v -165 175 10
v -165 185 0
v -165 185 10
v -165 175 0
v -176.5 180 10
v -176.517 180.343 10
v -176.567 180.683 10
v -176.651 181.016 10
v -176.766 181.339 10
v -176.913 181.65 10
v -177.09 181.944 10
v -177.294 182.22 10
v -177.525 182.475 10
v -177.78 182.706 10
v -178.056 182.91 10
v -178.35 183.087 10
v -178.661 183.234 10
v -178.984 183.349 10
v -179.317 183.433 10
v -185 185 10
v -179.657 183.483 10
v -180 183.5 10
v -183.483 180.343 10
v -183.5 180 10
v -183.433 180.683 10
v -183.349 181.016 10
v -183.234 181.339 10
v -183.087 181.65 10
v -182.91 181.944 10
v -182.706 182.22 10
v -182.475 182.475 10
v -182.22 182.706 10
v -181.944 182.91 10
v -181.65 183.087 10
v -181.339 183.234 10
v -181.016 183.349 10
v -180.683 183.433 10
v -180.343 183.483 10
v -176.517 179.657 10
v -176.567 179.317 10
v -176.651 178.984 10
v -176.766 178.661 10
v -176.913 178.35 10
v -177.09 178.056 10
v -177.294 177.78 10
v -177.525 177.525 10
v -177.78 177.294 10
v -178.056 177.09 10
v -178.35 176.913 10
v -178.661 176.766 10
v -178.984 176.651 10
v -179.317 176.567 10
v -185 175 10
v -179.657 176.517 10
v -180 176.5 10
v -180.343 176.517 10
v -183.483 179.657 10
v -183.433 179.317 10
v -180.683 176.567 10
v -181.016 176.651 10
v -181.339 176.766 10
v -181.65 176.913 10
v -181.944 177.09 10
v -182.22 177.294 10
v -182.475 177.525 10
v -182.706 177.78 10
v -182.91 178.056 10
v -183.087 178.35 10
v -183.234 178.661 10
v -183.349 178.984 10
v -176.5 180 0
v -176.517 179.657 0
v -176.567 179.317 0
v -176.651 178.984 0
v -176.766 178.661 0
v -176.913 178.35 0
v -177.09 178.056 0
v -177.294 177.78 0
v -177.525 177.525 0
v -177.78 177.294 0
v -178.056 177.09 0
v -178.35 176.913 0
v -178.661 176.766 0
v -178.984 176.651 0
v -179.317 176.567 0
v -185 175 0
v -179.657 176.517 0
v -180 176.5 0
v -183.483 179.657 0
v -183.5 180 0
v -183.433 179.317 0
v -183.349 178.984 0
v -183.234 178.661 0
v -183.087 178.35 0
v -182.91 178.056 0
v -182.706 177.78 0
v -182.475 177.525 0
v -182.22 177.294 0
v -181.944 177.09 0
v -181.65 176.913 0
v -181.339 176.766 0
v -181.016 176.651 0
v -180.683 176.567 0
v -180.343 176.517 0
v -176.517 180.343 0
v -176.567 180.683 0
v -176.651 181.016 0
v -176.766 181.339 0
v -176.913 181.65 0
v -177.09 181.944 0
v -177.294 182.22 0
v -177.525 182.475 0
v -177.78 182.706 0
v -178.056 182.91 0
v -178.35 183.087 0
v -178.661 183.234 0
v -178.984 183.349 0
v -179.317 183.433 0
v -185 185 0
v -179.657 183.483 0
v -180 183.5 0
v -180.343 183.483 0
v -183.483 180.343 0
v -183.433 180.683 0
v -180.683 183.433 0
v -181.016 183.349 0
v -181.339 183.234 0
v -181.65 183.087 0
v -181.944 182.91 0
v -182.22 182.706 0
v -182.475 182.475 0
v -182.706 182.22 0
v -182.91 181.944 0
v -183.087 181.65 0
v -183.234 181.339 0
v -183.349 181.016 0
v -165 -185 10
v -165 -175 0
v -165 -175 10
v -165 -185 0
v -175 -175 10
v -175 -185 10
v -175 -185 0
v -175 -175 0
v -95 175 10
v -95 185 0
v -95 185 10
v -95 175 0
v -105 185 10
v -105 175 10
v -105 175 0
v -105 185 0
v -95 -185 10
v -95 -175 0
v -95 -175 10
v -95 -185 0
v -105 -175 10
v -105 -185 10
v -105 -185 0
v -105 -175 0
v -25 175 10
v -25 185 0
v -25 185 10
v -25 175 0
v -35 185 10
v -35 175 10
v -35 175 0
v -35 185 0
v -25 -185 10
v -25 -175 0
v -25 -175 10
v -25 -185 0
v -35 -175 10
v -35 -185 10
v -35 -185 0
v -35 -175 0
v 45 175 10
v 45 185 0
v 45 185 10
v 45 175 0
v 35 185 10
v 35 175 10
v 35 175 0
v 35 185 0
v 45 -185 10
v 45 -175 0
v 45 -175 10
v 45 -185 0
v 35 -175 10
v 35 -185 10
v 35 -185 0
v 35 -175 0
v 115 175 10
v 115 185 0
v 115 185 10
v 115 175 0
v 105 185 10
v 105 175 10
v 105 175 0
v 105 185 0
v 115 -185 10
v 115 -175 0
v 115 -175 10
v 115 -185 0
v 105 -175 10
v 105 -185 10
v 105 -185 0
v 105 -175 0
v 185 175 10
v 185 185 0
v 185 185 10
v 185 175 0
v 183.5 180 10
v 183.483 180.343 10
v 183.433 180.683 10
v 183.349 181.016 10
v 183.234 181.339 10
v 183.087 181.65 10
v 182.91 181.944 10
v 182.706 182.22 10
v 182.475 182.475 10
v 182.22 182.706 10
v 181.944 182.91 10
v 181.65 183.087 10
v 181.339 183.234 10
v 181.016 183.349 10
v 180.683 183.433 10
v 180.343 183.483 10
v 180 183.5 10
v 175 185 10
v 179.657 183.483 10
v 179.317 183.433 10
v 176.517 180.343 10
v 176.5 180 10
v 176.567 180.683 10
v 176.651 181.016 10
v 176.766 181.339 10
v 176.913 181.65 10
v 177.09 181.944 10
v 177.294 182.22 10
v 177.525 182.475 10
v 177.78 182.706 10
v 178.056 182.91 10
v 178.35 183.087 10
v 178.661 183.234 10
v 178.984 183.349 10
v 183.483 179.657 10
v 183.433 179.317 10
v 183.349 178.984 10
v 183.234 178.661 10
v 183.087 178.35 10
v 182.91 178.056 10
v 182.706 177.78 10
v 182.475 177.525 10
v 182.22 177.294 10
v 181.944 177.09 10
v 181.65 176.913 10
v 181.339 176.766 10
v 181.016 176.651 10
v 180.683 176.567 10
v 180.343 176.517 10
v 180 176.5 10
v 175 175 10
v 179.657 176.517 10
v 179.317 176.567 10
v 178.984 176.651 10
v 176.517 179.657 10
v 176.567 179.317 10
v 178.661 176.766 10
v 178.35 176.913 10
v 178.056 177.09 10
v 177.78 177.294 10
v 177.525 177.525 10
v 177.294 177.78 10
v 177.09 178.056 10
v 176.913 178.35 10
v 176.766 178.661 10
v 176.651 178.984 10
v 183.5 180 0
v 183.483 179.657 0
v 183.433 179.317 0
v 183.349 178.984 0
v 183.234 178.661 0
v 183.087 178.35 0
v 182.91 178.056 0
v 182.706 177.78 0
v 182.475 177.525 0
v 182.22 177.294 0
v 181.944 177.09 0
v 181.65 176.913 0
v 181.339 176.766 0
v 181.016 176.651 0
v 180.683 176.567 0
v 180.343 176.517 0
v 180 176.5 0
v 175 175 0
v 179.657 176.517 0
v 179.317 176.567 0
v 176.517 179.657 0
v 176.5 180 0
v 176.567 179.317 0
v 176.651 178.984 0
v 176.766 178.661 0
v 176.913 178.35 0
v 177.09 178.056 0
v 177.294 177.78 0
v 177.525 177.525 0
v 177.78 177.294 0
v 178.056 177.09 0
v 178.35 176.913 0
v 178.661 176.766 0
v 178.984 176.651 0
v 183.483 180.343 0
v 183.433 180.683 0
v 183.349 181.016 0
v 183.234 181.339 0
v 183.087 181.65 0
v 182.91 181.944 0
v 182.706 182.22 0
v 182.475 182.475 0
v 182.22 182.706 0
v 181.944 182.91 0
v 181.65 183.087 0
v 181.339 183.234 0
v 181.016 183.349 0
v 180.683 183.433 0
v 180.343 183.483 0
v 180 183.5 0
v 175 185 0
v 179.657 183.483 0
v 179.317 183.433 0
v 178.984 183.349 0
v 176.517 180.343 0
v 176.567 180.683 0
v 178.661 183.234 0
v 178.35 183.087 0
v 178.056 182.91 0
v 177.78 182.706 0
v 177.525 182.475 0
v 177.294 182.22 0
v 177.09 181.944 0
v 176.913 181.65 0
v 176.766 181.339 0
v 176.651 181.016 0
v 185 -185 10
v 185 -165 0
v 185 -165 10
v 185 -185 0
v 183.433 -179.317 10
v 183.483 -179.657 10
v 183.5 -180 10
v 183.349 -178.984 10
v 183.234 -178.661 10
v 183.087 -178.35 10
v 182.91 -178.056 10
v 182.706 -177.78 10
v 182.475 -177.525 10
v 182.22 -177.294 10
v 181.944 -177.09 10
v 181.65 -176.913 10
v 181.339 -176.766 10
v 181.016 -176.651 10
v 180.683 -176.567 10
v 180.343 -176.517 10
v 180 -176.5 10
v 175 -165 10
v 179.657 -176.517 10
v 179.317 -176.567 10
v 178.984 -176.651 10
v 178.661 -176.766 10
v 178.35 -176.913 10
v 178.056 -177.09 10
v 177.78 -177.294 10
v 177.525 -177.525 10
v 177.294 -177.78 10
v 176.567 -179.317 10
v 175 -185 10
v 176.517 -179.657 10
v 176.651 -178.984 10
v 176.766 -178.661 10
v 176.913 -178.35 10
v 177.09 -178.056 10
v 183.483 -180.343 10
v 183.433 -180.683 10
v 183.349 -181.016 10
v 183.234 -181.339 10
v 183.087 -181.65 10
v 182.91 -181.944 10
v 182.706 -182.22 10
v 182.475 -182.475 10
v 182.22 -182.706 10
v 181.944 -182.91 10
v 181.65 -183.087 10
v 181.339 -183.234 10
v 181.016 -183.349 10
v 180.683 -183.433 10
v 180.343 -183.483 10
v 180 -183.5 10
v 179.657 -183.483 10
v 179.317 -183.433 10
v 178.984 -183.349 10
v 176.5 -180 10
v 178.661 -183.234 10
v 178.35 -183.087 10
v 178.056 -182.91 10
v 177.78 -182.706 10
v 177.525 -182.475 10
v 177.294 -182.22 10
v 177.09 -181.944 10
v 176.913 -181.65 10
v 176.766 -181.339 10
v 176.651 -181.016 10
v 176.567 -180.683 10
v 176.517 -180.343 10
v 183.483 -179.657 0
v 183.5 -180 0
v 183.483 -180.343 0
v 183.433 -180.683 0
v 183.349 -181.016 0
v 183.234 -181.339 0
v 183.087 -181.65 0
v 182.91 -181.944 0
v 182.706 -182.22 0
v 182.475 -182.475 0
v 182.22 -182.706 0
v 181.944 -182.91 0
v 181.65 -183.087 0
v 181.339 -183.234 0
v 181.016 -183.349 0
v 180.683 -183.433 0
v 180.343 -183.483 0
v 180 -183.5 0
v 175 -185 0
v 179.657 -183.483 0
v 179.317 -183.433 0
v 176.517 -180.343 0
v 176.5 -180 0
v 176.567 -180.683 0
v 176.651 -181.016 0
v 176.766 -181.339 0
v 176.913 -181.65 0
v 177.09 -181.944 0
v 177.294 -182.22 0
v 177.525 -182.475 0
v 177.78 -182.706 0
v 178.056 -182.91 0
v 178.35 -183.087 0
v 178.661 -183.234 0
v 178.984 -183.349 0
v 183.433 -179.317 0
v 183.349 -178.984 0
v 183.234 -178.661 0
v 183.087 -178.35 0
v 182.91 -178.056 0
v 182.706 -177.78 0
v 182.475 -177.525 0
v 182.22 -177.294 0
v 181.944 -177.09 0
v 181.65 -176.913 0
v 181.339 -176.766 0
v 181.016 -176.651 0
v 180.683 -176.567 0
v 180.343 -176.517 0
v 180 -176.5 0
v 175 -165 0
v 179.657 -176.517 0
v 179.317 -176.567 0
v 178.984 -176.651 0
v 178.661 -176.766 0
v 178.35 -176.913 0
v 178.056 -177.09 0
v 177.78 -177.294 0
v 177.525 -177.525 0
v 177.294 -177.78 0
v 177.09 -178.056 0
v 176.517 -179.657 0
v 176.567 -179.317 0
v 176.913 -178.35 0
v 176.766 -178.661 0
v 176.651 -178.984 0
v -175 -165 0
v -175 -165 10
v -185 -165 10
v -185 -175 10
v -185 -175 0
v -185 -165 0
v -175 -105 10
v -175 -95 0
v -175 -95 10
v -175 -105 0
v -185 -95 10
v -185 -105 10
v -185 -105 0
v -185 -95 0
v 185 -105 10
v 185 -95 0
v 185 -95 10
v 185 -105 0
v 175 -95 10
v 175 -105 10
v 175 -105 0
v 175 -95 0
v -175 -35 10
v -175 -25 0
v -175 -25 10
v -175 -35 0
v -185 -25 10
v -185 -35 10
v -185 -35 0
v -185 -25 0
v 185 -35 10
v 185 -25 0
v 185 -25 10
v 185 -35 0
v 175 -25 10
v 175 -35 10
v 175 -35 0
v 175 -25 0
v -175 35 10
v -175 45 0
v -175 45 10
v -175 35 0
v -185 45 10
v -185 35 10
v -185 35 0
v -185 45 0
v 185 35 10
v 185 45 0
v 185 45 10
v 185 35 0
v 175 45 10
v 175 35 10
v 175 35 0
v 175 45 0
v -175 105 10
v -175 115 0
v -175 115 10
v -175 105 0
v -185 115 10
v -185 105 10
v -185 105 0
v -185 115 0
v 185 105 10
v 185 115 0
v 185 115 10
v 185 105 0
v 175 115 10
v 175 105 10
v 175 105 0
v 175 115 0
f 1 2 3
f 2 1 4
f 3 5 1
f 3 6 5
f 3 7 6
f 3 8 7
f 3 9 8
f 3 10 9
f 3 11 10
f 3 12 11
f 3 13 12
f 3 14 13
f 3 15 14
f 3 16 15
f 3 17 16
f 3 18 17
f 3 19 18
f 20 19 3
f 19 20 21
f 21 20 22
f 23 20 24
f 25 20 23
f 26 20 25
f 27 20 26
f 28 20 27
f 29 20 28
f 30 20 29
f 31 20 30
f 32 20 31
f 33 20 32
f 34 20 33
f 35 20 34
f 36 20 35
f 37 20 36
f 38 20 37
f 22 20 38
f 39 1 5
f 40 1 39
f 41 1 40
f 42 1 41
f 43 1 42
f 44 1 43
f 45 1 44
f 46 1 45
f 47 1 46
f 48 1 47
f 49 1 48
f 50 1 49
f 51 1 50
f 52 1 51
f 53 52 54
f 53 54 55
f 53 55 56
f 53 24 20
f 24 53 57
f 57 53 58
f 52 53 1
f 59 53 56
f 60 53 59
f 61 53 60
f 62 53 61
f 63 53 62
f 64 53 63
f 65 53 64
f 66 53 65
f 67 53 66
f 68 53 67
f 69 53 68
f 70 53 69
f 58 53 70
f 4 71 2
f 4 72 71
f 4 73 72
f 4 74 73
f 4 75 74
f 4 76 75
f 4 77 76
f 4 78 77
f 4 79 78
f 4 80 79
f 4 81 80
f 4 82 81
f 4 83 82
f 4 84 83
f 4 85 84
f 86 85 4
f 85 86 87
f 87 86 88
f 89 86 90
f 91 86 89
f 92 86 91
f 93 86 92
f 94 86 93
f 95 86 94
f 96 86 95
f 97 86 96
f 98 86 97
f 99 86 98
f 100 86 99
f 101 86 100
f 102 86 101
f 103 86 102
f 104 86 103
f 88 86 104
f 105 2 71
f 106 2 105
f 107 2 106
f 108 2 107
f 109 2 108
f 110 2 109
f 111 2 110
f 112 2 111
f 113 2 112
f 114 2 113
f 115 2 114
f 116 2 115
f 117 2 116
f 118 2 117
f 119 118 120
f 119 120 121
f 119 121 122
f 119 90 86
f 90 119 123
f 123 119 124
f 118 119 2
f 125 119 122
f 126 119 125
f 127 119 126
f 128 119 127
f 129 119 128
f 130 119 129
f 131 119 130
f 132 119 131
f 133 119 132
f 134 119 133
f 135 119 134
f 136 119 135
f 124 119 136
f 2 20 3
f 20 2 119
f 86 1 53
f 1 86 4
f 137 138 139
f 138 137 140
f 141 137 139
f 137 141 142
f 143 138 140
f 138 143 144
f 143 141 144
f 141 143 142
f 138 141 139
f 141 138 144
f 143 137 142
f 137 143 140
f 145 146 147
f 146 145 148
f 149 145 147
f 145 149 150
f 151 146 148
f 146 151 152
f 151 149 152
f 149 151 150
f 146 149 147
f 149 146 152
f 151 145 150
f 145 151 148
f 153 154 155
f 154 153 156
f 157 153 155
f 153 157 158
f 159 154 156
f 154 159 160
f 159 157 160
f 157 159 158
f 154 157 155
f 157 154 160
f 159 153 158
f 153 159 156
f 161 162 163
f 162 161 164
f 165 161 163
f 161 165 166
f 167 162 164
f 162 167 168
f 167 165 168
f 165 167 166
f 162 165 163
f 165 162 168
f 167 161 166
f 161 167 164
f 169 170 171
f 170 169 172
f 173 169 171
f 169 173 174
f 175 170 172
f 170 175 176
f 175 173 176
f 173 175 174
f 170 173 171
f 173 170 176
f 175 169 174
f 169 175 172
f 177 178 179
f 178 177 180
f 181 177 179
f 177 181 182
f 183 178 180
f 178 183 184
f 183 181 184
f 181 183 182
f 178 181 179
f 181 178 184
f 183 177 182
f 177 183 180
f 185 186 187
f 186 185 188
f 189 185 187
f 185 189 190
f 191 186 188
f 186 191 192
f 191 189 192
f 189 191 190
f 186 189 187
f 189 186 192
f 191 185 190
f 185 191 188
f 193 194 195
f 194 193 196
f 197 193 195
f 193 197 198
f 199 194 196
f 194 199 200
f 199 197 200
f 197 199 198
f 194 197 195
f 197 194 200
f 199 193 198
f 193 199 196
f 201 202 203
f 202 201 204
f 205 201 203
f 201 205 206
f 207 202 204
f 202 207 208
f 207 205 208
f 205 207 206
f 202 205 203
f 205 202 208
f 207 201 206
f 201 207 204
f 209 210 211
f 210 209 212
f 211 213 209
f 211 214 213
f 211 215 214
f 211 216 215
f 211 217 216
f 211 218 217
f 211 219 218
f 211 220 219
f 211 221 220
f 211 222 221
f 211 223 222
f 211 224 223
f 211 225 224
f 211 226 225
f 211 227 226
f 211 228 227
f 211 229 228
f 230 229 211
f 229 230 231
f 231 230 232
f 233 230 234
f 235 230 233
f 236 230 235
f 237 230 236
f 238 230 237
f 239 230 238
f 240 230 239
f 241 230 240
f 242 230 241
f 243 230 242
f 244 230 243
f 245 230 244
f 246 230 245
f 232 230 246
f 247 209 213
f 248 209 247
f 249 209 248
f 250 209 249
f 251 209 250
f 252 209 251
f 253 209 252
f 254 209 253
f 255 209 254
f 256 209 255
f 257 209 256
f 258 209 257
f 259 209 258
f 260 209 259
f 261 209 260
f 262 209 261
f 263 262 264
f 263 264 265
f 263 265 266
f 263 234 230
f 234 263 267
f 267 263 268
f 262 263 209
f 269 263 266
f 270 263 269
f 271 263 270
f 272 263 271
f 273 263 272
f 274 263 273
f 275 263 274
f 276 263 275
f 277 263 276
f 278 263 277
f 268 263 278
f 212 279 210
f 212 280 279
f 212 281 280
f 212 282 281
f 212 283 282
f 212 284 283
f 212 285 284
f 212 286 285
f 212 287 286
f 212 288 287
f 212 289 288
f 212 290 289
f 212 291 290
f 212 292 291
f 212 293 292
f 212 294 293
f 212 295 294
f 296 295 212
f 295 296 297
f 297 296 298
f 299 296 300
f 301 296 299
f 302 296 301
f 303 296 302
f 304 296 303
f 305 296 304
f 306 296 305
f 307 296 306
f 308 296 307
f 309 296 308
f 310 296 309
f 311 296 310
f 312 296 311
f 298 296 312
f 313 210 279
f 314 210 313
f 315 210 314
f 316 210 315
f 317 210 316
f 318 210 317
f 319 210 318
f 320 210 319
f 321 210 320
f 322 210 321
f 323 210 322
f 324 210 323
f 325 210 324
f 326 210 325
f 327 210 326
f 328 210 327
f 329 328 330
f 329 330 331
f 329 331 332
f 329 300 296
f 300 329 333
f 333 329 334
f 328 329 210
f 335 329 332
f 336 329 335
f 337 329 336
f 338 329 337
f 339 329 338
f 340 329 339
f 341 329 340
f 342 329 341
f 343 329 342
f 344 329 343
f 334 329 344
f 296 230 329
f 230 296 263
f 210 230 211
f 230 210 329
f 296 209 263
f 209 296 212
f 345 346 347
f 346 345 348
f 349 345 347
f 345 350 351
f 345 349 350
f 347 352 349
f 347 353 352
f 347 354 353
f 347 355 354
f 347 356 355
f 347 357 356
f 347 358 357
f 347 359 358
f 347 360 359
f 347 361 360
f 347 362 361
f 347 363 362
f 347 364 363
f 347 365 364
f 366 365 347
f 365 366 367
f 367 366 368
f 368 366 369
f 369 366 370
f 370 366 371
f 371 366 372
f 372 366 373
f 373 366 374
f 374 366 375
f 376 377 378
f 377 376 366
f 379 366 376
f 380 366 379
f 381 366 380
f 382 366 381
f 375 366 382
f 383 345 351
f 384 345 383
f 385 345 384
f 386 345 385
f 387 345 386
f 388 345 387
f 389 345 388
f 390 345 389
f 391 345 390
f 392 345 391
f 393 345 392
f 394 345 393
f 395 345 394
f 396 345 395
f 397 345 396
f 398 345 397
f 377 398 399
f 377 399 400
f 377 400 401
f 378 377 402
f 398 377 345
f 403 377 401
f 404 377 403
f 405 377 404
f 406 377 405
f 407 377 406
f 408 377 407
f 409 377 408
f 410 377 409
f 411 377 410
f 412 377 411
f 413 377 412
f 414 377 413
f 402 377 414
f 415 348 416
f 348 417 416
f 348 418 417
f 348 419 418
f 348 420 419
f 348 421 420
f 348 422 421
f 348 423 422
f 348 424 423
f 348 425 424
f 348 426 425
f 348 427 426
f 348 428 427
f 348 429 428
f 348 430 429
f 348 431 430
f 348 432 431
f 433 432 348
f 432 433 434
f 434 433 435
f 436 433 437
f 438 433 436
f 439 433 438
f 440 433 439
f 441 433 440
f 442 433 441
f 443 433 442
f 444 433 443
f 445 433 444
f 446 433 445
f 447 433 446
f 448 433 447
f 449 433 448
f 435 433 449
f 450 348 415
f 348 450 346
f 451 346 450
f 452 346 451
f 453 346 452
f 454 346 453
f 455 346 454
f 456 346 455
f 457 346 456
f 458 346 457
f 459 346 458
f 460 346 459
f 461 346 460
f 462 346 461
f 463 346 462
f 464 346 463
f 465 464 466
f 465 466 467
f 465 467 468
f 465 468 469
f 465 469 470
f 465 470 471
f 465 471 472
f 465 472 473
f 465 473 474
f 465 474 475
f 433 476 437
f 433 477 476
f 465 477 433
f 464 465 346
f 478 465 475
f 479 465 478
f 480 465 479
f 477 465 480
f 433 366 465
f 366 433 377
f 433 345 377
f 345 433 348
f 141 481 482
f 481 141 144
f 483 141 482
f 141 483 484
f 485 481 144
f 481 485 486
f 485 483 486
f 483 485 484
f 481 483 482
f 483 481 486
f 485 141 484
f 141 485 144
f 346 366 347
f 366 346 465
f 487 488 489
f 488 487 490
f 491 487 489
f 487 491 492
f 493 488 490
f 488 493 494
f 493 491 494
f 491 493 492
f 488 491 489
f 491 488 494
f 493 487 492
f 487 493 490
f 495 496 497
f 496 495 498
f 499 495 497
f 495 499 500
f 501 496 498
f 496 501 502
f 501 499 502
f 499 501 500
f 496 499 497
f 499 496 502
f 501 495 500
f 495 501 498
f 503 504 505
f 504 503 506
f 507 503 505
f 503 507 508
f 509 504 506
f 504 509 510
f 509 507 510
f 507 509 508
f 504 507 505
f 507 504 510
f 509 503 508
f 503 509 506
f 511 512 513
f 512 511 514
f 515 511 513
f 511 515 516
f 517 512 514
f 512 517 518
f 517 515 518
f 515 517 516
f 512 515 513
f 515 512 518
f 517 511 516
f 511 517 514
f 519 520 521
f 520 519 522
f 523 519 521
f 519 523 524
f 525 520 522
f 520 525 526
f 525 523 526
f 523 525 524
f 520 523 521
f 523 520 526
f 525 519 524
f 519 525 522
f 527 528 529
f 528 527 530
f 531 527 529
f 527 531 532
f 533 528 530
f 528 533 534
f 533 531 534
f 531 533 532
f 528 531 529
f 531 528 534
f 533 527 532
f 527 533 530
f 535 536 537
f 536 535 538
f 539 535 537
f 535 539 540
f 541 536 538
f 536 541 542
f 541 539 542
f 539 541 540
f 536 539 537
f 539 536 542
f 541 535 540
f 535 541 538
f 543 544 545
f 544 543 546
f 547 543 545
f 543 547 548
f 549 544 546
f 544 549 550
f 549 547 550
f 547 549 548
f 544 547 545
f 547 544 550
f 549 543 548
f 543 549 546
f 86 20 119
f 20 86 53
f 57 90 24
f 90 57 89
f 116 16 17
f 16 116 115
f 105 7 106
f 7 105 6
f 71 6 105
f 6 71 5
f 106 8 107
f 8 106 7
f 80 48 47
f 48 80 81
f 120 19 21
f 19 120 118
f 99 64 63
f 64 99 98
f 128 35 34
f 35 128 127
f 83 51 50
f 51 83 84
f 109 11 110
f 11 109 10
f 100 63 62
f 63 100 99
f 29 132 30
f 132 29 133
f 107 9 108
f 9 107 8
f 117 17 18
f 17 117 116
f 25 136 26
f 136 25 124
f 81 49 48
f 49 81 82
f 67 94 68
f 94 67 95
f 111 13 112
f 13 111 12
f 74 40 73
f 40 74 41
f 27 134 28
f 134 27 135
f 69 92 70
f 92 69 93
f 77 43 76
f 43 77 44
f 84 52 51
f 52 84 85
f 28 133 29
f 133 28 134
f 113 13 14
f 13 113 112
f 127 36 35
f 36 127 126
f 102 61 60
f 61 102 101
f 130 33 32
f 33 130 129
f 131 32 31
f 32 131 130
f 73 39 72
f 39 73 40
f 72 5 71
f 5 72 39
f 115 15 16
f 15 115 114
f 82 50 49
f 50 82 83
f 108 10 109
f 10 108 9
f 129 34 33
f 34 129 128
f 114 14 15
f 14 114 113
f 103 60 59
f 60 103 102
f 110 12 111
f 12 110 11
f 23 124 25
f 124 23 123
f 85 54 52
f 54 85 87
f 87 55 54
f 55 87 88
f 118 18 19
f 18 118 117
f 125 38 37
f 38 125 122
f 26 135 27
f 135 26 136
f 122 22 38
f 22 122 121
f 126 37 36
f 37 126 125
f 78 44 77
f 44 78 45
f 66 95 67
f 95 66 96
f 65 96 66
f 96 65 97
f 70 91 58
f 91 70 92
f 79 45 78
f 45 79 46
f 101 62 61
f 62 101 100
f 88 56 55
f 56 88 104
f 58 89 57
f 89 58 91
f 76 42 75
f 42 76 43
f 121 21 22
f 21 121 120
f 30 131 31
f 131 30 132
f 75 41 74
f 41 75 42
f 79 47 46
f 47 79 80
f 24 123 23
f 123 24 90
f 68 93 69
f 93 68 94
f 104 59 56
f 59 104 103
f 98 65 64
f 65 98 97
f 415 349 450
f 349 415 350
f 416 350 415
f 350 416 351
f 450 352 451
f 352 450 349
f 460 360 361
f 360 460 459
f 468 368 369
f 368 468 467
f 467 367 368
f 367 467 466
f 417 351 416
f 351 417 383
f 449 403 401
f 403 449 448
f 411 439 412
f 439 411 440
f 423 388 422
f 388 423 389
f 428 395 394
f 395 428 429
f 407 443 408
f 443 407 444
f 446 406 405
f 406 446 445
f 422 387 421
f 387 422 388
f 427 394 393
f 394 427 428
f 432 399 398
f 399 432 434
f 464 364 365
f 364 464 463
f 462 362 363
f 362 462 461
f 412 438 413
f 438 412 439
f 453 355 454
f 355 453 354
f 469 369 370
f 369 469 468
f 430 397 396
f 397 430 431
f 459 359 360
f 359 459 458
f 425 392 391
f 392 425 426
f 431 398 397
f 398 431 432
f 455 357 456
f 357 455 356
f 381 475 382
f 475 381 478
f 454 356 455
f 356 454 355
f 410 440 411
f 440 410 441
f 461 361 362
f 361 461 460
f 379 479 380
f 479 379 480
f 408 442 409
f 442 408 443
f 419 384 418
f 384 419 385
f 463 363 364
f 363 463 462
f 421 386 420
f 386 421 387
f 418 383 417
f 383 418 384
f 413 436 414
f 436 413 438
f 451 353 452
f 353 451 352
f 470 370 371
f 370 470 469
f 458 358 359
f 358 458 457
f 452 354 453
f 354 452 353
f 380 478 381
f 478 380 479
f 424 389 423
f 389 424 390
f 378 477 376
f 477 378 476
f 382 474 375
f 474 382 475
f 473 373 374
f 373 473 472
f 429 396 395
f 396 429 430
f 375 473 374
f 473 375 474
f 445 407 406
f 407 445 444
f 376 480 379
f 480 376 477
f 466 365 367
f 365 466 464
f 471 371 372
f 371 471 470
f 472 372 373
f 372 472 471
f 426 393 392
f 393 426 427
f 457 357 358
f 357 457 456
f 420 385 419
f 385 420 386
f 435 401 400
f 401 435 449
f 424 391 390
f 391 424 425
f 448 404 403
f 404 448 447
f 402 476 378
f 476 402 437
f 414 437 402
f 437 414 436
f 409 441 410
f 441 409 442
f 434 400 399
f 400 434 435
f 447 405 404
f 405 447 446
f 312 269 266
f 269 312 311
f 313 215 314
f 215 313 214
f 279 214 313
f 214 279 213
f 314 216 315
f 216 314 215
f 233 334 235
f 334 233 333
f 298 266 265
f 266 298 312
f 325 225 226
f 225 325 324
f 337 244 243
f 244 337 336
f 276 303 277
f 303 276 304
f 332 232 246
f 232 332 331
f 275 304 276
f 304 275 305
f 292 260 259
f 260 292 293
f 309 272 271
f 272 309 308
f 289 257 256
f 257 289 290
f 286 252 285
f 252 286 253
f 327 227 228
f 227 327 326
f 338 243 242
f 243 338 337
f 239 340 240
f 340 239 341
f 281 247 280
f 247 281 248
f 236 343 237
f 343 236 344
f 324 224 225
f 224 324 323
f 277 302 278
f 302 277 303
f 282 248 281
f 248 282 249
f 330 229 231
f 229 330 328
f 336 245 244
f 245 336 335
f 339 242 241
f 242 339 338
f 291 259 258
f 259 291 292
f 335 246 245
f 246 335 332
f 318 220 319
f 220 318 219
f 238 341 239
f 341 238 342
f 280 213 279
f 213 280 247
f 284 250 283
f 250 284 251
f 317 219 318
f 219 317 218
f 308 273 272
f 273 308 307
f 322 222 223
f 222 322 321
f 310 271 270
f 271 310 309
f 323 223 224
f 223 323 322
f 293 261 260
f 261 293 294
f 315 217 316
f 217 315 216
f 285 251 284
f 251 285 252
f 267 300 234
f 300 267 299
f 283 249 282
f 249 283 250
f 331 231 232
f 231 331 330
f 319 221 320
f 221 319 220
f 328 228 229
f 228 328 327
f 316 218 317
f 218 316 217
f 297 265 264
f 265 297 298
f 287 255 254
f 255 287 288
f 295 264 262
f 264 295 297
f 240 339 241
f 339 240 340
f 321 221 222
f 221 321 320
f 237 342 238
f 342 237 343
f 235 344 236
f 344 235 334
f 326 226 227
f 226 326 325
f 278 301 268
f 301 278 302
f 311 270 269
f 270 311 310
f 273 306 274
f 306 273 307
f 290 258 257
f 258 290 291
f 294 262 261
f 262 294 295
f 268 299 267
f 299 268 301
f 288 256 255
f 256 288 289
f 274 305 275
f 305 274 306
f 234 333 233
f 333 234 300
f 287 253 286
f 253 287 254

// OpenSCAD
// ring_21.scad - ring index 21 (z bottom = 210 mm)
$fn = 64; bar = 10; half_b = bar/2; outer = 370; half_outer = outer/2;
front_y = 180; back_y = -180; left_x = -180; right_x = 180;
x_centers = [-170, -100, -30, 40, 110, 180];
z_centers = [5, 85, 155, 225, 295, 365, 435, 505, 575, 645, 715]; ring_z = 210;
module place_box(cx, cy, sx, sy) { translate([cx - sx/2, cy - sy/2, 0]) cube([sx, sy, bar]); }

difference() { union() {
    for (x = x_centers) { place_box(x, front_y, bar, bar); place_box(x, back_y, bar, bar); }
    for (y = x_centers) { place_box(left_x, y, bar, bar); place_box(right_x, y, bar, bar); }
    for (zc = z_centers) if ((zc - half_b < ring_z + bar) && (zc + half_b > ring_z)) {
        translate([-half_outer, front_y - half_b, 0]) cube([outer, bar, bar]);
        translate([-half_outer, back_y - half_b, 0])  cube([outer, bar, bar]);
        translate([left_x - half_b, -half_outer, 0])  cube([bar, outer, bar]);
        translate([right_x - half_b, -half_outer, 0]) cube([bar, outer, bar]);
    }
  }
  for (cx = [-180, 180]) for (cy = [-180, 180]) translate([cx, cy, 0]) cylinder(h = bar, r = 3.5, $fn = 64);
}
